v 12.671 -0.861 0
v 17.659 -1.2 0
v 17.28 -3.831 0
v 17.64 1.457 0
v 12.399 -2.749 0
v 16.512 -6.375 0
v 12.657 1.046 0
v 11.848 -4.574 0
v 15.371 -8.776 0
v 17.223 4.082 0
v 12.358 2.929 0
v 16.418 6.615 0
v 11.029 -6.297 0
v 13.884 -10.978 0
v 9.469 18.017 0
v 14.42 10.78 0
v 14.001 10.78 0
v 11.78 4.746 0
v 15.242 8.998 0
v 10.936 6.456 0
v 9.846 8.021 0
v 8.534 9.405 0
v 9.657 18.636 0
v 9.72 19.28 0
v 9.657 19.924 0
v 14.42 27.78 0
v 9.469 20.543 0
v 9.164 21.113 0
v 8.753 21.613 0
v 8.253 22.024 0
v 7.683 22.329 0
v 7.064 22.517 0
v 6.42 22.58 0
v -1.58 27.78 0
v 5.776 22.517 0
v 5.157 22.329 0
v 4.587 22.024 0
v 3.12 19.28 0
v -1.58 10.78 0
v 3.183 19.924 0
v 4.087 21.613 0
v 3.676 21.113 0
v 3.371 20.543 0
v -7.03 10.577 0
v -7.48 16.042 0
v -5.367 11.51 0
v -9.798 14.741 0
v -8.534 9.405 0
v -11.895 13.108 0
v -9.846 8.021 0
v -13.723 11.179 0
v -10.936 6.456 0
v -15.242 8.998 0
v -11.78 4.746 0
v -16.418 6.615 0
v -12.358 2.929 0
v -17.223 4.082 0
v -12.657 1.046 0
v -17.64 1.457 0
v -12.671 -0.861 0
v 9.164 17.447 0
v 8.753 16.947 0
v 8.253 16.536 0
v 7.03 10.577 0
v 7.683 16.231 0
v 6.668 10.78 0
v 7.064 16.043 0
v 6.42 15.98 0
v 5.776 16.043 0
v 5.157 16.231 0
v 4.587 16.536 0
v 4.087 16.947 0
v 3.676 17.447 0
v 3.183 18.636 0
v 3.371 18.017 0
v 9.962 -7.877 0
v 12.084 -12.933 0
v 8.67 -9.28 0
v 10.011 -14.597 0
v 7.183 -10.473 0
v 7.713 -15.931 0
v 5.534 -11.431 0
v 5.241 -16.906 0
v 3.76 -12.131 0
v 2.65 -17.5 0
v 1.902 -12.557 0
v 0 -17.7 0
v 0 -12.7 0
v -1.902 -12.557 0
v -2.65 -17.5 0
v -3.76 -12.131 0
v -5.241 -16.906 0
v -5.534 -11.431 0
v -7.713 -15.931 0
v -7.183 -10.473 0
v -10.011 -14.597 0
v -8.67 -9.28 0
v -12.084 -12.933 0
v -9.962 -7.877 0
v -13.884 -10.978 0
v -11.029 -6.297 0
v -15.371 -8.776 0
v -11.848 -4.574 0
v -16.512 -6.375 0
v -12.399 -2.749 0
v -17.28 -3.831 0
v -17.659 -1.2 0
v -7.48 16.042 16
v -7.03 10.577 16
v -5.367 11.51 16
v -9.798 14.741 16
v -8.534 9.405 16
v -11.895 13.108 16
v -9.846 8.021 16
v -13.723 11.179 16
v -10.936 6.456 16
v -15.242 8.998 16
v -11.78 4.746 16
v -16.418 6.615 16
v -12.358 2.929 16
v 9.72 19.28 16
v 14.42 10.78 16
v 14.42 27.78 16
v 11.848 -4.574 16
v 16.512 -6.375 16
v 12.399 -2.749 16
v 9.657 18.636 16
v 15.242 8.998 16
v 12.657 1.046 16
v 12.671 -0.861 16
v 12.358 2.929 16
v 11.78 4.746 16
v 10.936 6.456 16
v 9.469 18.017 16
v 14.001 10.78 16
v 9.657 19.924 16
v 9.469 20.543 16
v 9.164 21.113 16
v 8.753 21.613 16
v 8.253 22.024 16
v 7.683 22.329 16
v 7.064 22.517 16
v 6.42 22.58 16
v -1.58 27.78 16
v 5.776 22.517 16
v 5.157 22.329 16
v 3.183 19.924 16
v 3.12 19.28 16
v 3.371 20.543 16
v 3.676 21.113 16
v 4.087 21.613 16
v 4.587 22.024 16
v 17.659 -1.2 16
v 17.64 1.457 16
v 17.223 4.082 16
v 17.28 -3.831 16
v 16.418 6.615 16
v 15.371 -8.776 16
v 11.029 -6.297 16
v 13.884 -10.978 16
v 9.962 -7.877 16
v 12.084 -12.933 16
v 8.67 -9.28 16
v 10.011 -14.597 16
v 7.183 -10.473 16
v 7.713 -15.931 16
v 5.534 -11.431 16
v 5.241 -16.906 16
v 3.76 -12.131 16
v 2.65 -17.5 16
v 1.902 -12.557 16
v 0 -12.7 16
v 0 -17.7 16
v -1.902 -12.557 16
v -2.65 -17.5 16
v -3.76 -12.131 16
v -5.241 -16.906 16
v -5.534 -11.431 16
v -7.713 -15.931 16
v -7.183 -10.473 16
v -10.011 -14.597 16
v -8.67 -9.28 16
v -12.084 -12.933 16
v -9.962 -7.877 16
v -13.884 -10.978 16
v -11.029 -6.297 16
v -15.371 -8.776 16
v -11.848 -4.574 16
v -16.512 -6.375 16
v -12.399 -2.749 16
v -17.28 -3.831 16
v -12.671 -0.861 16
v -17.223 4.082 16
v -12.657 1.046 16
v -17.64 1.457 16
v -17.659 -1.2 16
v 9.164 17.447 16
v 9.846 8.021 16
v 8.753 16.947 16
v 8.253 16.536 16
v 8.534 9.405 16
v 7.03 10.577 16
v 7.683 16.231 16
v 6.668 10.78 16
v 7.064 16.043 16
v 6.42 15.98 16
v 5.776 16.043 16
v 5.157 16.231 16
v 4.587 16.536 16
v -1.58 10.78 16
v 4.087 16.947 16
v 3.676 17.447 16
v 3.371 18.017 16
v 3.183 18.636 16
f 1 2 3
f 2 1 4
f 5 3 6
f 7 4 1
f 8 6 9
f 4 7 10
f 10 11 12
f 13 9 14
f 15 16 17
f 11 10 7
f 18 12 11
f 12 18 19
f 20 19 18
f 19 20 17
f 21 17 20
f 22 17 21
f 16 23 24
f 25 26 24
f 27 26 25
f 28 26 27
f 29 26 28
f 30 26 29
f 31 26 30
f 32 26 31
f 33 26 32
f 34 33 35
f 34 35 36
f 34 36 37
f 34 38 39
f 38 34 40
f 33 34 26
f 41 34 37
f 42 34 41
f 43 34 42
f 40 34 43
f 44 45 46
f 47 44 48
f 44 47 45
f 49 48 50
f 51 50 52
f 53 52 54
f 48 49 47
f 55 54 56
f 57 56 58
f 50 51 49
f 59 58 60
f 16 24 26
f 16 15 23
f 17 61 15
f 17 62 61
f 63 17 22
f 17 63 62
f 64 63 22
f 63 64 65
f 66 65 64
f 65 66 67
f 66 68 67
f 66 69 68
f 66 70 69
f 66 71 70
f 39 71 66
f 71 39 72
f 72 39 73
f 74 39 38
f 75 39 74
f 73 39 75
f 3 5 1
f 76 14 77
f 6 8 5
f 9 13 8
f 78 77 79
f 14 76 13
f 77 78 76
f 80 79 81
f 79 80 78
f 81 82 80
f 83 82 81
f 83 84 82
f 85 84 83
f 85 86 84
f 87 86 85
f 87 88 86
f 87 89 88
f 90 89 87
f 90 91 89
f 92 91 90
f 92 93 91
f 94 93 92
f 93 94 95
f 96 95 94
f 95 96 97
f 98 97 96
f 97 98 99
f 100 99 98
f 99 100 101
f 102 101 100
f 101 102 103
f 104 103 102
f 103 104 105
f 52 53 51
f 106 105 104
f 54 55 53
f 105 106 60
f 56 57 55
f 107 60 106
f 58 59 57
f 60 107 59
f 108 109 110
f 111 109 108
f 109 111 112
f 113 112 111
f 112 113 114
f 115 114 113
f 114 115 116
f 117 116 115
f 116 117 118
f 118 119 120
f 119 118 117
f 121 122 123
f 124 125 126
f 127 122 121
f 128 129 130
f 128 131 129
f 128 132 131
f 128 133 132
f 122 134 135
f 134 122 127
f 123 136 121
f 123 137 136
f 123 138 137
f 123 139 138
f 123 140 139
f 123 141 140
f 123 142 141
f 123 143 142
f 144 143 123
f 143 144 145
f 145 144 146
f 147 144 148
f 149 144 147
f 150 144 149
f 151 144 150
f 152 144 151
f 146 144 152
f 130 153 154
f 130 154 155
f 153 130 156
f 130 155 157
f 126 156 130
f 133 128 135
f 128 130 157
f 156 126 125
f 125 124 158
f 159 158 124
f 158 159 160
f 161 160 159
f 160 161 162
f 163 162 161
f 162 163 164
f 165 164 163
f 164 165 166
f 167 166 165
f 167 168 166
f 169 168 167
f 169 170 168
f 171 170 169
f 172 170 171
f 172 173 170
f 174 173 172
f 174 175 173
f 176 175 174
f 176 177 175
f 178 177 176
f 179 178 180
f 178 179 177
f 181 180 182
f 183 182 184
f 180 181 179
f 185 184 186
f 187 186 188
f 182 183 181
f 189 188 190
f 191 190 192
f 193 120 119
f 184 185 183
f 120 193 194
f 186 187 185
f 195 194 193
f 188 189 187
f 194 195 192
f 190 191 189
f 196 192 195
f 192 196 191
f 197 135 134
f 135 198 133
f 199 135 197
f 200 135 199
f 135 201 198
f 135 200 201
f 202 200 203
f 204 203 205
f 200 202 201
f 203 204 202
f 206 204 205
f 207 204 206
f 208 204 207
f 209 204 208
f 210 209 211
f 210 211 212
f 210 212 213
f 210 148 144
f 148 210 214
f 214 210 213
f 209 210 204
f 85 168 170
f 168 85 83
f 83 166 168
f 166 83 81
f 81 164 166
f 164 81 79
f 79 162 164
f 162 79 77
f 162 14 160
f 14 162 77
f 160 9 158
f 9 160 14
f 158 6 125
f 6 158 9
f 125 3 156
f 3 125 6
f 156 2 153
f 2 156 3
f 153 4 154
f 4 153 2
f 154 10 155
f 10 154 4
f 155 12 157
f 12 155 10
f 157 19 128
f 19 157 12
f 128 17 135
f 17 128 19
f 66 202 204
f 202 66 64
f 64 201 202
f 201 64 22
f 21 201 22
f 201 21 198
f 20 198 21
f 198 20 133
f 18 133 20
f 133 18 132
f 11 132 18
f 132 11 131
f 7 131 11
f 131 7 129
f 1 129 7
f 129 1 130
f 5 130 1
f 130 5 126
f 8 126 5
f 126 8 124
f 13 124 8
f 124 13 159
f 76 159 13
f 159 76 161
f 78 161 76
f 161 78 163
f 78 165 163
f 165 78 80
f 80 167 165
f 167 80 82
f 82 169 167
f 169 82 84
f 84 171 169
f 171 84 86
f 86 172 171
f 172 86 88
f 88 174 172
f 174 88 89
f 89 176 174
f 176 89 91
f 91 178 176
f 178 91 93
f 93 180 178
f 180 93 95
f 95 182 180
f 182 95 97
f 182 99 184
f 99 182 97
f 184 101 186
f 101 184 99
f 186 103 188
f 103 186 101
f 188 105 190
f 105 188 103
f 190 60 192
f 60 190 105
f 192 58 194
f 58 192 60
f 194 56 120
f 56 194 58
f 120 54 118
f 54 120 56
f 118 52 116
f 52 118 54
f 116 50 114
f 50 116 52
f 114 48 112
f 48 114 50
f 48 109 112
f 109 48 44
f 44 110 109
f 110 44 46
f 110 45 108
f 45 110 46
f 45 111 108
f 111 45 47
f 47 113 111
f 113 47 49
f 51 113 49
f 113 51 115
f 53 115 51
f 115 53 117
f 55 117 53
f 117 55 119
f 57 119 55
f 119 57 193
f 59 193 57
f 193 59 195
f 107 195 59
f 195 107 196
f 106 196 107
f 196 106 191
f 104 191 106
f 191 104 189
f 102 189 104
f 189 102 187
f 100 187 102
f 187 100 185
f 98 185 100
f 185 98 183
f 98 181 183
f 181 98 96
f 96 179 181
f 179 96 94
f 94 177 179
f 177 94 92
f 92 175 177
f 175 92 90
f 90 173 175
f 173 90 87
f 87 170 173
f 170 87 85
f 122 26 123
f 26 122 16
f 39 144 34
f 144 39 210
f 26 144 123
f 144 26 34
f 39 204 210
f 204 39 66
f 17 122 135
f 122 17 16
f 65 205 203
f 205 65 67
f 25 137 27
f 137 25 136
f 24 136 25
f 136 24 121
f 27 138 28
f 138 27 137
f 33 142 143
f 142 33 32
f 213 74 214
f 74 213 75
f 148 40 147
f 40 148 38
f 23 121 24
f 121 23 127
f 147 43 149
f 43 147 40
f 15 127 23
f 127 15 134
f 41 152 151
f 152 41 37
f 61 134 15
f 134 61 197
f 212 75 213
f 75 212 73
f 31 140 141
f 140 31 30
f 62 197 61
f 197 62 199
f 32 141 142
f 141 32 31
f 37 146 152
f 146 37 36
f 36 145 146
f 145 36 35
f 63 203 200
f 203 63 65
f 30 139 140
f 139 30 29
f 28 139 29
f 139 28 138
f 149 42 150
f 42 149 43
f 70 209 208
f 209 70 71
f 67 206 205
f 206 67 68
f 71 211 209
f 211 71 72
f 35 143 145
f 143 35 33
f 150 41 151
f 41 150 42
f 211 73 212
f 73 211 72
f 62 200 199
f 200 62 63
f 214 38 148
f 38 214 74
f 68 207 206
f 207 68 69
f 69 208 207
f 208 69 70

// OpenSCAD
$fn = 32;

// ----------------------------------------------------------------------
// Pipe clamp: 35.4 mm ring, 5 mm wall, 16 mm wide
// ----------------------------------------------------------------------

// --- parameters (mm) ---
outer_r = 17.7;           // clamp outside radius
inner_r = 12.7;           // pipe bore radius
band = 5;                 // band thickness
clamp_w = 16;             // clamp width
opening = 50;             // opening angle between the ends
lug_w = 16;               // lug width
lug_len = 17;             // lug length
bolt_d = 6.6;             // bolt hole

clamp_profile = [[-7.48, 16.042], [-9.798, 14.741], [-11.895, 13.108], [-13.723, 11.179], [-15.242, 8.998], [-16.418, 6.615], [-17.223, 4.082], [-17.64, 1.457], [-17.659, -1.2], [-17.28, -3.831], [-16.512, -6.375], [-15.371, -8.776], [-13.884, -10.978], [-12.084, -12.933], [-10.011, -14.597], [-7.713, -15.931], [-5.241, -16.906], [-2.65, -17.5], [0, -17.7], [2.65, -17.5], [5.241, -16.906], [7.713, -15.931], [10.011, -14.597], [12.084, -12.933], [13.884, -10.978], [15.371, -8.776], [16.512, -6.375], [17.28, -3.831], [17.659, -1.2], [17.64, 1.457], [17.223, 4.082], [16.418, 6.615], [15.242, 8.998], [13.723, 11.179], [11.895, 13.108], [9.798, 14.741], [7.48, 16.042], [5.367, 11.51], [7.03, 10.577], [8.534, 9.405], [9.846, 8.021], [10.936, 6.456], [11.78, 4.746], [12.358, 2.929], [12.657, 1.046], [12.671, -0.861], [12.399, -2.749], [11.848, -4.574], [11.029, -6.297], [9.962, -7.877], [8.67, -9.28], [7.183, -10.473], [5.534, -11.431], [3.76, -12.131], [1.902, -12.557], [0, -12.7], [-1.902, -12.557], [-3.76, -12.131], [-5.534, -11.431], [-7.183, -10.473], [-8.67, -9.28], [-9.962, -7.877], [-11.029, -6.297], [-11.848, -4.574], [-12.399, -2.749], [-12.671, -0.861], [-12.657, 1.046], [-12.358, 2.929], [-11.78, 4.746], [-10.936, 6.456], [-9.846, 8.021], [-8.534, 9.405], [-7.03, 10.577], [-5.367, 11.51]];

difference() {
  union() {
    linear_extrude(height = clamp_w) polygon(clamp_profile);
    /* bolt lug on the other end */
    translate([-1.58, 10.78, 0]) cube([lug_w, 17, clamp_w]);
  }
  translate([6.42, 19.28, -2.5]) cylinder(h = clamp_w + 5, d = bolt_d);
}
